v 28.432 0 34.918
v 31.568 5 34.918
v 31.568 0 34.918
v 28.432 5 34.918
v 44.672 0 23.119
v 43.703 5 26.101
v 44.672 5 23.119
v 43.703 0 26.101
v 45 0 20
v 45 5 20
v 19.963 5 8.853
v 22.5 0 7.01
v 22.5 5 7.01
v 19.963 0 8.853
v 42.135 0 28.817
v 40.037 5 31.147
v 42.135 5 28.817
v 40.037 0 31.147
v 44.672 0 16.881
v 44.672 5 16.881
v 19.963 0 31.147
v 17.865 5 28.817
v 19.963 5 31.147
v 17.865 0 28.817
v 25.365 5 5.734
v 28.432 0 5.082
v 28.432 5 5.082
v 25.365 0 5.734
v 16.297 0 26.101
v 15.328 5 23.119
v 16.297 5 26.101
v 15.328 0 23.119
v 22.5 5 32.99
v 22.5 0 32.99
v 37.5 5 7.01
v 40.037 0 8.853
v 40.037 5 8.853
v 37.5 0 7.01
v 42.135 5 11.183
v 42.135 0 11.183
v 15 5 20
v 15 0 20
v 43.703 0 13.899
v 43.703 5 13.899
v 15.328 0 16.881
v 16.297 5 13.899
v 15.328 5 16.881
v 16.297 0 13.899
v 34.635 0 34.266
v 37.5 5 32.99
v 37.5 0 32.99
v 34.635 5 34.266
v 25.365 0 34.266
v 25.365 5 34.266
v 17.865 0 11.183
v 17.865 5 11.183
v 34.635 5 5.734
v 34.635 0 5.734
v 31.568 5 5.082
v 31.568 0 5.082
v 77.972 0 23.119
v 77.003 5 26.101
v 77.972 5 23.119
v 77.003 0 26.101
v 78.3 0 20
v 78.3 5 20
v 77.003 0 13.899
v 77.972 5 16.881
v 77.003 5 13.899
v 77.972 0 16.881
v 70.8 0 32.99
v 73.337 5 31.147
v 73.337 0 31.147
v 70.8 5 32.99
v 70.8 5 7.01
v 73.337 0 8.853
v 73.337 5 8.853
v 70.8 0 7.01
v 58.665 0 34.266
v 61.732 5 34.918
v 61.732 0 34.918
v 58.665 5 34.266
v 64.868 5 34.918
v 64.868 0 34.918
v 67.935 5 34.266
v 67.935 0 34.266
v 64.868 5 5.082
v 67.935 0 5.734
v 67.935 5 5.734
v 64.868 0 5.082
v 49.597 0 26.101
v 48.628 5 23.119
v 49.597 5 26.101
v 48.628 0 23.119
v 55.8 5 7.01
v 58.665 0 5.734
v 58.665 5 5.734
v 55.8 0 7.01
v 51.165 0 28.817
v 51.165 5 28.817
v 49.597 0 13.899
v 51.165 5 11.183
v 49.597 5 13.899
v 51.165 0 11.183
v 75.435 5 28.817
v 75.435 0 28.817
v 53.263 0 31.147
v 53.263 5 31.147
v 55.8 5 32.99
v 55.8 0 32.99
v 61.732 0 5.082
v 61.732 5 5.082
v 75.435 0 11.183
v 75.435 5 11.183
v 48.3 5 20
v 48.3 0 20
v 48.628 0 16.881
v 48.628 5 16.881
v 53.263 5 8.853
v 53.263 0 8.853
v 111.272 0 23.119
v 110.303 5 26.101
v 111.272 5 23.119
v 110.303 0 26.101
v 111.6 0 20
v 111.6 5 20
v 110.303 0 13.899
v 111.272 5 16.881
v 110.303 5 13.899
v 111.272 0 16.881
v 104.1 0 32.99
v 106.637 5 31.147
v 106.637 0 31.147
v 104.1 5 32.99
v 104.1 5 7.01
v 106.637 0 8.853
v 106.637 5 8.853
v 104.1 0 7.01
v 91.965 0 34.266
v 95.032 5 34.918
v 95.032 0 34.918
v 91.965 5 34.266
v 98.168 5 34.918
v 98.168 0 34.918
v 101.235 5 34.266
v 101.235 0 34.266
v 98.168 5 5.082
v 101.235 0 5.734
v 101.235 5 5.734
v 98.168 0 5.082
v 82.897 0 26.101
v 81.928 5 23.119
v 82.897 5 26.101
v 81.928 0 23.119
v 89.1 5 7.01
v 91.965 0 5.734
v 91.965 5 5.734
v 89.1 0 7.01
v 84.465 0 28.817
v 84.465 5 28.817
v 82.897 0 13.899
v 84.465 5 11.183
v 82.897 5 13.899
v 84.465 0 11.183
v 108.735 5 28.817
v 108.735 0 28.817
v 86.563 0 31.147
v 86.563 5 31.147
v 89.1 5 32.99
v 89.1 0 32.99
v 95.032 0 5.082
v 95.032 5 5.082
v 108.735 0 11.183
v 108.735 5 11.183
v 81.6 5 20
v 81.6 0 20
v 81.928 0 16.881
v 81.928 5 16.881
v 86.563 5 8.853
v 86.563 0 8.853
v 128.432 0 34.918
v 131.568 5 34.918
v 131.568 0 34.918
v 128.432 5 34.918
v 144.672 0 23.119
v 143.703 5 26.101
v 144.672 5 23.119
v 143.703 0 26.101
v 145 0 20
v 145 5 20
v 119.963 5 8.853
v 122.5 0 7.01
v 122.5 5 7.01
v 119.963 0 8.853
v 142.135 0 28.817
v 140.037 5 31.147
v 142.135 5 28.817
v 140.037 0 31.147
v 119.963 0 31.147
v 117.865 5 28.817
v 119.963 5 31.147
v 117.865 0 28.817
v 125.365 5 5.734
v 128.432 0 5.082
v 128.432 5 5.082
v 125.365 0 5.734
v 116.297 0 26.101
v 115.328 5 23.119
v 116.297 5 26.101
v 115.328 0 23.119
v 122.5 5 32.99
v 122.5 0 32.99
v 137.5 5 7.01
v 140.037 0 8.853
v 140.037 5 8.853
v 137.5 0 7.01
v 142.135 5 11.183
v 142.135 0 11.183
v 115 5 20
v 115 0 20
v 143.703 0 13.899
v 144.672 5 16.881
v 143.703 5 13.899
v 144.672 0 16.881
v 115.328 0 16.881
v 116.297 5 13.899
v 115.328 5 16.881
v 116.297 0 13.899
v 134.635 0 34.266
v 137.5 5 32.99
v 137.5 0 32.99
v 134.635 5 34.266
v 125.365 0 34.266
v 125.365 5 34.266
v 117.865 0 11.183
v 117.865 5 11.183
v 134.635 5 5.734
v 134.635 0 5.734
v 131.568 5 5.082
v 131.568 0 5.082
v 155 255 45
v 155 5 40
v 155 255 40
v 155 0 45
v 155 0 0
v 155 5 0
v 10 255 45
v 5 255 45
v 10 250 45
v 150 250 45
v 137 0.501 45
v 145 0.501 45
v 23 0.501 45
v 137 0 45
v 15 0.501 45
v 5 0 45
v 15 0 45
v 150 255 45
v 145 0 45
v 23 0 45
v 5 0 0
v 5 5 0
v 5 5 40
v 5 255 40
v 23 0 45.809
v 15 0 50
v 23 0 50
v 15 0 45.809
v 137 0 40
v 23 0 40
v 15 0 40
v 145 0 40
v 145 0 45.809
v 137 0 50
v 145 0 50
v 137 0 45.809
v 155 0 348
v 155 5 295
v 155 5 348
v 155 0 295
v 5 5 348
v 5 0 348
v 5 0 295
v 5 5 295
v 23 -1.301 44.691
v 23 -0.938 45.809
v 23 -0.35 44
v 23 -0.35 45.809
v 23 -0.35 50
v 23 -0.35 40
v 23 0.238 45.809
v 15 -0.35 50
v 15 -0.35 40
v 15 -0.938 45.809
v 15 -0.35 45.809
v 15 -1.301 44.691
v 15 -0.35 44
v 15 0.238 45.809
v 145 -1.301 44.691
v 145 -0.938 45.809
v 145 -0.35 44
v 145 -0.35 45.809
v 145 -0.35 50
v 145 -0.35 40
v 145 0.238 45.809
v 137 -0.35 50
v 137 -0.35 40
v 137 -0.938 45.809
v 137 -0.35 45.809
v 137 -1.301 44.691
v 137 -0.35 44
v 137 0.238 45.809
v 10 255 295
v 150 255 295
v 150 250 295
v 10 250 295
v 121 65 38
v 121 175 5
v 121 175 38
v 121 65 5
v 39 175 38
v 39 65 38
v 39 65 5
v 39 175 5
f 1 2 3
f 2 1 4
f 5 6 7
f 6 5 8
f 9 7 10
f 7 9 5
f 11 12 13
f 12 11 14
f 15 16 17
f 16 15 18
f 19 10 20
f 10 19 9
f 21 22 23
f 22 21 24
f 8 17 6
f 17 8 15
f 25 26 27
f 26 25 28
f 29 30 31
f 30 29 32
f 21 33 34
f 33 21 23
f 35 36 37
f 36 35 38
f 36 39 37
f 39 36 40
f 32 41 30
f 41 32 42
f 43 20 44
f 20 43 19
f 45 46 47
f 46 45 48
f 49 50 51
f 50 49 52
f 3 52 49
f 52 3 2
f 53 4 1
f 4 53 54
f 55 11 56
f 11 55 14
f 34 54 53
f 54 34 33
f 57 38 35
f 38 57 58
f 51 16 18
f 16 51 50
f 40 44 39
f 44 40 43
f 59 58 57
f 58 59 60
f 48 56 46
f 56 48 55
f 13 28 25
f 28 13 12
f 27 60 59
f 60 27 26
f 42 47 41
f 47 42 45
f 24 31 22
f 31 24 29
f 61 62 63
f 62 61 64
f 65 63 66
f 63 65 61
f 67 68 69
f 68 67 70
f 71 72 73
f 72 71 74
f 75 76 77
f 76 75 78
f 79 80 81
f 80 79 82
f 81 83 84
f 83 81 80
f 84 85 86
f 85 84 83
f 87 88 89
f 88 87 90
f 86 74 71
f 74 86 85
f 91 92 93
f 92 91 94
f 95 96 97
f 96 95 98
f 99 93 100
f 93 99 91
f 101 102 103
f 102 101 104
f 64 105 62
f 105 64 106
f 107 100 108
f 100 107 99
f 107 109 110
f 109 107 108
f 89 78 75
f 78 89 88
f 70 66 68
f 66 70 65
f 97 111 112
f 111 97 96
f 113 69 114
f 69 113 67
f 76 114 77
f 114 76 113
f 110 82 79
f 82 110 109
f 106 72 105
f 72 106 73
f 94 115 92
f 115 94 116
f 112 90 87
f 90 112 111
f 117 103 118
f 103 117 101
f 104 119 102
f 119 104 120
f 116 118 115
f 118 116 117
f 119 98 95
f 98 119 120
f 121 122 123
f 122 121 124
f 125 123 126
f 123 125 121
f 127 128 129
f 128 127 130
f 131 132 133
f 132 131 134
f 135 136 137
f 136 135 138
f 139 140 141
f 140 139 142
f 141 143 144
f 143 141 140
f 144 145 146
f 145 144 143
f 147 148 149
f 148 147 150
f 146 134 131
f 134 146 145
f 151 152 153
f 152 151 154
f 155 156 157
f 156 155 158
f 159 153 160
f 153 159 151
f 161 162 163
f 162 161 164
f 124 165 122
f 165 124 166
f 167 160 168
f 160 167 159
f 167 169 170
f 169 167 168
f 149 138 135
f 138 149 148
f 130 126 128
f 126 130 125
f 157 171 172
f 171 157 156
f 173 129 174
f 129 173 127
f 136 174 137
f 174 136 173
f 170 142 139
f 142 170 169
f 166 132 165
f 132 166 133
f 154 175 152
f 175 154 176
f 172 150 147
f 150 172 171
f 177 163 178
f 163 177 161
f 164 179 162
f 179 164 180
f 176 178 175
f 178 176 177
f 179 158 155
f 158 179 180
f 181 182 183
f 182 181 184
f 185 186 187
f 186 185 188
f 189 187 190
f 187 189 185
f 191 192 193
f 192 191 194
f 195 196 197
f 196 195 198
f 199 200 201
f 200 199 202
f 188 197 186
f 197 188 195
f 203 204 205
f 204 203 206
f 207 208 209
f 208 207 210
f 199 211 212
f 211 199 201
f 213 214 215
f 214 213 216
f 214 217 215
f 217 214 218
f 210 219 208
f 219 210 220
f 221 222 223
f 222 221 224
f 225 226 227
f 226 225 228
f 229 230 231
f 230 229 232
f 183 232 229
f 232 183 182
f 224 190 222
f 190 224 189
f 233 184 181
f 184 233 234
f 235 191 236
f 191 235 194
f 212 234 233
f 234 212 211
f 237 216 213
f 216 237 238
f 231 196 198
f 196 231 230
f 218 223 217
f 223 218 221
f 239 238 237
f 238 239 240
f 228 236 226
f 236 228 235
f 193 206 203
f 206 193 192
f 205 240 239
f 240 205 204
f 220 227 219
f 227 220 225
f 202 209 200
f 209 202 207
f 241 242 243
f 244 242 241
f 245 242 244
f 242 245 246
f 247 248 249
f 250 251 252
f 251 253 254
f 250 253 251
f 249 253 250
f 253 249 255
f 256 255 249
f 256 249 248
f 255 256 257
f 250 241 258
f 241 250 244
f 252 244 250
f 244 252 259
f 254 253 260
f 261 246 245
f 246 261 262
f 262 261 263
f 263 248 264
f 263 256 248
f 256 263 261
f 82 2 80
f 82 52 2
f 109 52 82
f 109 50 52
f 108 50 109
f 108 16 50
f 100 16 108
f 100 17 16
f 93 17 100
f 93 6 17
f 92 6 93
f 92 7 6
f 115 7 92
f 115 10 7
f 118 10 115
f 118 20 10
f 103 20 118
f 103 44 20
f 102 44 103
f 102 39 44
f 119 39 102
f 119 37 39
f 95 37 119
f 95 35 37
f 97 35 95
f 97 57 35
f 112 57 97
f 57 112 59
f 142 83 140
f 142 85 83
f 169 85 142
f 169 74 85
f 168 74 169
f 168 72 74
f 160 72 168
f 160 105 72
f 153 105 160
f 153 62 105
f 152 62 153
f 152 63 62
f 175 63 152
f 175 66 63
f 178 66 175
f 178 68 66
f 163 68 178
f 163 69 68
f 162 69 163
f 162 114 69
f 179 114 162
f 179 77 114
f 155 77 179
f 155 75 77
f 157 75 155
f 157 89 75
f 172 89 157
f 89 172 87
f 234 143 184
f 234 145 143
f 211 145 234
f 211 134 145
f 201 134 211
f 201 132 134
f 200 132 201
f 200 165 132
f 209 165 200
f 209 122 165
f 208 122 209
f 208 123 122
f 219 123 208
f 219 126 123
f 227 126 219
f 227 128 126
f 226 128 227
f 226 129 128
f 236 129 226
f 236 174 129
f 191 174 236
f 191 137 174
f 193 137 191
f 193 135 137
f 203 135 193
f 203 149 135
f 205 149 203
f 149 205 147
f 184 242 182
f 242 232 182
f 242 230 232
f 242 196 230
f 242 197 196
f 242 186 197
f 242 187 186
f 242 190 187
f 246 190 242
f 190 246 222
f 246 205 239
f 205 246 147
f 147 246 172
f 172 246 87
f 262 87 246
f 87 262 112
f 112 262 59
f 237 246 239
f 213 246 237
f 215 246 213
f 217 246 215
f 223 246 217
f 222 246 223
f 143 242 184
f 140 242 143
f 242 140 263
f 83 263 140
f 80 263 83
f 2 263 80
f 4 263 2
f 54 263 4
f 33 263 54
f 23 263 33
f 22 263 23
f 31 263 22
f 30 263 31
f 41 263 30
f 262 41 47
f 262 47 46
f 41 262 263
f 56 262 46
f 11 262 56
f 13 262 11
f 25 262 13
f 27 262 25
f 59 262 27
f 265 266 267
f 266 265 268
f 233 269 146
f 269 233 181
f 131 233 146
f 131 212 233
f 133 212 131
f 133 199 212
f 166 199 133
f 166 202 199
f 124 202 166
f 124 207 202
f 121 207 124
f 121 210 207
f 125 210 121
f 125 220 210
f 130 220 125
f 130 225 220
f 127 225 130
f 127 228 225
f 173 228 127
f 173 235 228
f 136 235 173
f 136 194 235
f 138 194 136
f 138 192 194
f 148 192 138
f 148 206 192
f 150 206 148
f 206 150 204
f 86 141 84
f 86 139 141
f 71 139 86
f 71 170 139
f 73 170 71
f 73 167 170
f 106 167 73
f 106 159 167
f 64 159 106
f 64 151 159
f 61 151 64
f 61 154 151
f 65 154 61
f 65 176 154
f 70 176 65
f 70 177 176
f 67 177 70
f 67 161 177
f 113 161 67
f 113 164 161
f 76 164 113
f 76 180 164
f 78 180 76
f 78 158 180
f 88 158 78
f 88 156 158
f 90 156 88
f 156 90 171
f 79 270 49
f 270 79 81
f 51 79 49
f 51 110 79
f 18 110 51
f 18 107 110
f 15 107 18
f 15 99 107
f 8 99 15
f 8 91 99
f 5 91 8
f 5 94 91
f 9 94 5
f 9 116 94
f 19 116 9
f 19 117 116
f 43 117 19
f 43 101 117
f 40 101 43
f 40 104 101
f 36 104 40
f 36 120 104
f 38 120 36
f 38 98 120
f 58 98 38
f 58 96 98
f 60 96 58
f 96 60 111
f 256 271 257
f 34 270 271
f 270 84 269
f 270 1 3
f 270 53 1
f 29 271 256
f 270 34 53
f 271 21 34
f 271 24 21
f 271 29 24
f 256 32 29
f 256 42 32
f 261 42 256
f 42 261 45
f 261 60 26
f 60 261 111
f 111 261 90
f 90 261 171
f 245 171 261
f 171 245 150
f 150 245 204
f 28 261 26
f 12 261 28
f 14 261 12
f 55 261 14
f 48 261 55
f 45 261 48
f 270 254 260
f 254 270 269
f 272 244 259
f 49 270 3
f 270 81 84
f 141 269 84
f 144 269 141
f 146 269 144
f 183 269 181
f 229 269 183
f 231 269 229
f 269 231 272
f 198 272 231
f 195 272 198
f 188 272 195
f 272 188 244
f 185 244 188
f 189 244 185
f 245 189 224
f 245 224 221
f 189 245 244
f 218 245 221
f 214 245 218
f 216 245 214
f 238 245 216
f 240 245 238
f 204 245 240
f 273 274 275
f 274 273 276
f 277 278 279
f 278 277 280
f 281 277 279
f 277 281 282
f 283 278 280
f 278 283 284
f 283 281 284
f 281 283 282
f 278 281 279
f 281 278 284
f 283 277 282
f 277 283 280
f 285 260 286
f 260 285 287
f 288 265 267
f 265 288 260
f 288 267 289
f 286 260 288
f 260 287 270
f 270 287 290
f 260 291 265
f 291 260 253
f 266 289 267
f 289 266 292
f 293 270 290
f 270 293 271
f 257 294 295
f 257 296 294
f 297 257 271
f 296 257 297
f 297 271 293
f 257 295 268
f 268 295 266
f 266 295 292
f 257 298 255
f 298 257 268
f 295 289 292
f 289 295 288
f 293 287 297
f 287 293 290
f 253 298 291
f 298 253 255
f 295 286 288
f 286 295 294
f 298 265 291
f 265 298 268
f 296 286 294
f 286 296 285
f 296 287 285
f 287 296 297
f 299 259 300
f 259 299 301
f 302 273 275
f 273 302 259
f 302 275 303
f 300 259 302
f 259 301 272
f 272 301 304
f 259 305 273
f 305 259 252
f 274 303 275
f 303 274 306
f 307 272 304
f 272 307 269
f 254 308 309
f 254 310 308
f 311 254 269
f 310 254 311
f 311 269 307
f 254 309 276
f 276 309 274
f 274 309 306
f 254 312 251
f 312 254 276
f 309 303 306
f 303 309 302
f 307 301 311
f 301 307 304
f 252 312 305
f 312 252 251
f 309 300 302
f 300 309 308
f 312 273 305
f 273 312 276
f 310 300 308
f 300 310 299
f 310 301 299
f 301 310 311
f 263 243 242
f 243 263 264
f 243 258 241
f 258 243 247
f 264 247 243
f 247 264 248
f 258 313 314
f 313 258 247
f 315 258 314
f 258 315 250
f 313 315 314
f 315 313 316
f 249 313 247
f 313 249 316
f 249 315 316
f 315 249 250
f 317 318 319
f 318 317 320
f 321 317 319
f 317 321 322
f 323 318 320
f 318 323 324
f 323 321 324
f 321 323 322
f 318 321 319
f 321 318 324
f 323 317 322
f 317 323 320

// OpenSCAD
// file: psu.scad
module psu(size=[82, 110, 33]) {
    color("#7F3F3F") cube(size);
}
// file: tec.scad
module tec(size = [30, 30, 5]) {
    color("#EFEFEF") cube(size);
}
// file: heatsink.scad
module heatsink(w = 150, l = 100, h = 45, t = 10, f = 29, ft = 1) {
    module lineup(n = 1, space = 1) {
        for (i = [0 : n - 1]) {
            translate([space * i, 0, 0]) {
                children(0);
            }
        }
    };

    color("#CCCCCC") union() {
        cube([l, w, t]);
        lineup(f, (l - ft) / (f - 1)) {
            cube([ft, w, h]);
        }
    } 
}
// main file
use <heatsink.scad>;
use <tec.scad>;
use <psu.scad>

module top() {
    module tecs() {
        translate([-0.01, -0.01, -0.01]) {
            translate([0, 0, 0]) tec([30, 30, 5]);
            translate([66, 0, 0]) tec([30, 30, 5]);
            translate([0, 60, 0]) tec([30, 30, 5]);
            translate([66, 60, 0]) tec([30, 30, 5]);
            translate([0, 120, 0]) tec([30, 30, 5]);
            translate([66, 120, 0]) tec([30, 30, 5]);
        }
    }

    module foam() {
        color("#1F1F1F") difference() {
            cube([96, 150, 5]);
            translate([-0.01, -0.01, -0.01]) {
                translate([0, 0, 0]) tec([30, 30, 5.02]);
                translate([66.2, 0, 0]) tec([30, 30, 5.02]);
                translate([0, 60, 0]) tec([30, 30, 5.02]);
                translate([66.2, 60, 0]) tec([30, 30, 5.02]);
                translate([0, 120.2, 0]) tec([30, 30, 5.02]);
                translate([66.2, 120.2, 0]) tec([30, 30, 5.02]);
            }
        }
    }

    module vapor_chambers() {
        color("#EFEFEF") union() {
            translate([0, 0, -3]) {
                cube([96, 150, 3]);
            }
            translate([0, 0, 5]) {
                cube([96, 150, 3]);
            }
        }    
    }

    module heatsinks() {
        translate([-12, -25, 8]) {
            heatsink(l = 120, w = 200, h=20, t = 2, f = 16, ft = 1.4);
            translate([0, -25, -11]) {
                scale([1, 1, -1]) {
                    heatsink(l = 120, w = 250, h=40, t = 4.8, f = 16, ft = 2.4);
                }
            }
        }
    }

    module mounting() {
        translate([-27, -50, 0]) {
            difference() {
                union() {
                    cube([150, 250, 5]);
                    translate([5, 5, 4.99]) color("#000000") cube([140, 240, 3]);
                    translate([0, 0, -3.01]) color("#000000") cube([150, 250, 3]);
                }
                translate([21, 45, -4]) cube([108, 160, 13]);
            }
        }
    }

    scale([1, 1, -1]) {
        tecs();
        foam();
        vapor_chambers();
        heatsinks();
        mounting();
    }
}


module side_walls() {
    // inner right
    translate([5, 5, 0]) cube([5, 250 + 35, 5 + 35]);
    translate([5, 5, 5 + 35 + 5]) difference() {
        cube([5, 250, 250]);
        // magnet
        translate([0.01, 5, 200]) cube([5, 10, 40]);
    }
    // outer right
    translate([0, 0, 0]) cube([5, 5 + 250 + 35 + 5, 5 + 35 + 5 + 250 + 5 + 3 + 40 + 5]);

    // inner left
    translate([150, 5, 0]) cube([5, 250 + 35, 5 + 35]);
    translate([150, 5, 5 + 35 + 5]) difference() { 
        cube([5, 250, 250]);
        // magnet
        translate([-0.01, 5, 200]) cube([5, 10, 40]);
    }
    // outer left
    translate([150 + 5, 0, 0]) cube([5, 5 + 250 + 35 + 5, 5 + 35 + 5 + 250 + 5 + 3 + 40 + 5]);
}

module tops() {
    // inner top
    translate([27 + 5, 50 + 5, 5 + 35 + 5 + 250 + 5]) top();
    // outer top
    translate([5, 5 + 35, 5 + 35 + 5 + 250 + 5 + 3 + 40]) cube([150,  -5 - 35 + 5 + 250 + 35 + 5, 5]);

}

module bottoms() {
    // inner bottom
    translate([5, 5, 5 + 35]) cube([150, 250, 5]);
    // outer bottom
    %translate([5 + 5, 5, 0]) cube([140, 250 + 35, 5]);
}

module fronts() {
    // outer front upper
    translate([5, 0, 5 + 35 + 5 + 250]) cube([150, 5, 5 + 3 + 40 + 5]);

    // outer front lower
    translate([5, 0, 0]) difference() {
        cube([150, 5, 35 + 5 + 5]);
        // 30mm fan holes
        translate([5, 6, 5 + 15]) {
            translate([5 + 15, 0, 0]) rotate([90, 0, 0]) cylinder(d = 30, h = 7);
            translate([53.3, 0, 0]) rotate([90, 0, 0]) cylinder(d = 30, h = 7);
            translate([86.6, 0, 0]) rotate([90, 0, 0]) cylinder(d = 30, h = 7);
            translate([140 - 15 - 5, 0, 0]) rotate([90, 0, 0]) cylinder(d = 30, h = 7);
        }
    }
}

module backs() {
    // inner back
    translate([5 + 5, 5 + 250 - 5, 5 + 35 + 5]) cube([140, 5, 250]);
    // outer back
    %translate([5, 5 + 250 + 35, 0]) difference() {
        cube([150, 5, 5 + 35 + 5 + 250 + 5 + 3 + 40]);
        // cable hole
        translate([-10 + 150 - 5 - 15 , -1, 5 + 10]) cube([10, 7, 10]);
    }
}

module door() {
    // door
    %union() {
        // inner door
        translate([5 + 5, 5, 5 + 35 + 5]) cube([140, 5, 250]);
        // outer door
        translate([5, 0, 5 + 35 + 5]) difference() {
            union() {
                cube([150, 5, 250]);
                translate([75 - 5, -4.99, 230]) cube([10, 5, 10]);
            }
            // magnet
            translate([5 + 5, -0.01, 200]) cube([10, 5.02, 40]);
            translate([-10 + 150 - 5 - 5, -0.01, 200]) cube([10, 5.02, 40]);
        }
    }

    // hinge
    union() {
        // right
        translate([5 + 5 + 5, -0.35, 5 + 35 + 5 - 5]) cube([8, 0.35, 10]);
        translate([5 + 5 + 5, -0.35, 5 + 35 + 5]) rotate([0, 90, 0]) cylinder(d = 2, h = 8);
        // left
        translate([5 + 150 - 5 - 5 - 8, -0.35, 5 + 35 + 5 - 5]) cube([8, 0.35, 10]);
        translate([5 + 150 - 5 - 5 - 8, -0.35, 5 + 35 + 5]) rotate([0, 90, 0]) cylinder(d = 2, h = 8);
    }
}

%side_walls();
%tops();
bottoms();
fronts();
backs();
door();

translate([5 + 34, 5 + 250 - 110 - 80, 5]) psu();
